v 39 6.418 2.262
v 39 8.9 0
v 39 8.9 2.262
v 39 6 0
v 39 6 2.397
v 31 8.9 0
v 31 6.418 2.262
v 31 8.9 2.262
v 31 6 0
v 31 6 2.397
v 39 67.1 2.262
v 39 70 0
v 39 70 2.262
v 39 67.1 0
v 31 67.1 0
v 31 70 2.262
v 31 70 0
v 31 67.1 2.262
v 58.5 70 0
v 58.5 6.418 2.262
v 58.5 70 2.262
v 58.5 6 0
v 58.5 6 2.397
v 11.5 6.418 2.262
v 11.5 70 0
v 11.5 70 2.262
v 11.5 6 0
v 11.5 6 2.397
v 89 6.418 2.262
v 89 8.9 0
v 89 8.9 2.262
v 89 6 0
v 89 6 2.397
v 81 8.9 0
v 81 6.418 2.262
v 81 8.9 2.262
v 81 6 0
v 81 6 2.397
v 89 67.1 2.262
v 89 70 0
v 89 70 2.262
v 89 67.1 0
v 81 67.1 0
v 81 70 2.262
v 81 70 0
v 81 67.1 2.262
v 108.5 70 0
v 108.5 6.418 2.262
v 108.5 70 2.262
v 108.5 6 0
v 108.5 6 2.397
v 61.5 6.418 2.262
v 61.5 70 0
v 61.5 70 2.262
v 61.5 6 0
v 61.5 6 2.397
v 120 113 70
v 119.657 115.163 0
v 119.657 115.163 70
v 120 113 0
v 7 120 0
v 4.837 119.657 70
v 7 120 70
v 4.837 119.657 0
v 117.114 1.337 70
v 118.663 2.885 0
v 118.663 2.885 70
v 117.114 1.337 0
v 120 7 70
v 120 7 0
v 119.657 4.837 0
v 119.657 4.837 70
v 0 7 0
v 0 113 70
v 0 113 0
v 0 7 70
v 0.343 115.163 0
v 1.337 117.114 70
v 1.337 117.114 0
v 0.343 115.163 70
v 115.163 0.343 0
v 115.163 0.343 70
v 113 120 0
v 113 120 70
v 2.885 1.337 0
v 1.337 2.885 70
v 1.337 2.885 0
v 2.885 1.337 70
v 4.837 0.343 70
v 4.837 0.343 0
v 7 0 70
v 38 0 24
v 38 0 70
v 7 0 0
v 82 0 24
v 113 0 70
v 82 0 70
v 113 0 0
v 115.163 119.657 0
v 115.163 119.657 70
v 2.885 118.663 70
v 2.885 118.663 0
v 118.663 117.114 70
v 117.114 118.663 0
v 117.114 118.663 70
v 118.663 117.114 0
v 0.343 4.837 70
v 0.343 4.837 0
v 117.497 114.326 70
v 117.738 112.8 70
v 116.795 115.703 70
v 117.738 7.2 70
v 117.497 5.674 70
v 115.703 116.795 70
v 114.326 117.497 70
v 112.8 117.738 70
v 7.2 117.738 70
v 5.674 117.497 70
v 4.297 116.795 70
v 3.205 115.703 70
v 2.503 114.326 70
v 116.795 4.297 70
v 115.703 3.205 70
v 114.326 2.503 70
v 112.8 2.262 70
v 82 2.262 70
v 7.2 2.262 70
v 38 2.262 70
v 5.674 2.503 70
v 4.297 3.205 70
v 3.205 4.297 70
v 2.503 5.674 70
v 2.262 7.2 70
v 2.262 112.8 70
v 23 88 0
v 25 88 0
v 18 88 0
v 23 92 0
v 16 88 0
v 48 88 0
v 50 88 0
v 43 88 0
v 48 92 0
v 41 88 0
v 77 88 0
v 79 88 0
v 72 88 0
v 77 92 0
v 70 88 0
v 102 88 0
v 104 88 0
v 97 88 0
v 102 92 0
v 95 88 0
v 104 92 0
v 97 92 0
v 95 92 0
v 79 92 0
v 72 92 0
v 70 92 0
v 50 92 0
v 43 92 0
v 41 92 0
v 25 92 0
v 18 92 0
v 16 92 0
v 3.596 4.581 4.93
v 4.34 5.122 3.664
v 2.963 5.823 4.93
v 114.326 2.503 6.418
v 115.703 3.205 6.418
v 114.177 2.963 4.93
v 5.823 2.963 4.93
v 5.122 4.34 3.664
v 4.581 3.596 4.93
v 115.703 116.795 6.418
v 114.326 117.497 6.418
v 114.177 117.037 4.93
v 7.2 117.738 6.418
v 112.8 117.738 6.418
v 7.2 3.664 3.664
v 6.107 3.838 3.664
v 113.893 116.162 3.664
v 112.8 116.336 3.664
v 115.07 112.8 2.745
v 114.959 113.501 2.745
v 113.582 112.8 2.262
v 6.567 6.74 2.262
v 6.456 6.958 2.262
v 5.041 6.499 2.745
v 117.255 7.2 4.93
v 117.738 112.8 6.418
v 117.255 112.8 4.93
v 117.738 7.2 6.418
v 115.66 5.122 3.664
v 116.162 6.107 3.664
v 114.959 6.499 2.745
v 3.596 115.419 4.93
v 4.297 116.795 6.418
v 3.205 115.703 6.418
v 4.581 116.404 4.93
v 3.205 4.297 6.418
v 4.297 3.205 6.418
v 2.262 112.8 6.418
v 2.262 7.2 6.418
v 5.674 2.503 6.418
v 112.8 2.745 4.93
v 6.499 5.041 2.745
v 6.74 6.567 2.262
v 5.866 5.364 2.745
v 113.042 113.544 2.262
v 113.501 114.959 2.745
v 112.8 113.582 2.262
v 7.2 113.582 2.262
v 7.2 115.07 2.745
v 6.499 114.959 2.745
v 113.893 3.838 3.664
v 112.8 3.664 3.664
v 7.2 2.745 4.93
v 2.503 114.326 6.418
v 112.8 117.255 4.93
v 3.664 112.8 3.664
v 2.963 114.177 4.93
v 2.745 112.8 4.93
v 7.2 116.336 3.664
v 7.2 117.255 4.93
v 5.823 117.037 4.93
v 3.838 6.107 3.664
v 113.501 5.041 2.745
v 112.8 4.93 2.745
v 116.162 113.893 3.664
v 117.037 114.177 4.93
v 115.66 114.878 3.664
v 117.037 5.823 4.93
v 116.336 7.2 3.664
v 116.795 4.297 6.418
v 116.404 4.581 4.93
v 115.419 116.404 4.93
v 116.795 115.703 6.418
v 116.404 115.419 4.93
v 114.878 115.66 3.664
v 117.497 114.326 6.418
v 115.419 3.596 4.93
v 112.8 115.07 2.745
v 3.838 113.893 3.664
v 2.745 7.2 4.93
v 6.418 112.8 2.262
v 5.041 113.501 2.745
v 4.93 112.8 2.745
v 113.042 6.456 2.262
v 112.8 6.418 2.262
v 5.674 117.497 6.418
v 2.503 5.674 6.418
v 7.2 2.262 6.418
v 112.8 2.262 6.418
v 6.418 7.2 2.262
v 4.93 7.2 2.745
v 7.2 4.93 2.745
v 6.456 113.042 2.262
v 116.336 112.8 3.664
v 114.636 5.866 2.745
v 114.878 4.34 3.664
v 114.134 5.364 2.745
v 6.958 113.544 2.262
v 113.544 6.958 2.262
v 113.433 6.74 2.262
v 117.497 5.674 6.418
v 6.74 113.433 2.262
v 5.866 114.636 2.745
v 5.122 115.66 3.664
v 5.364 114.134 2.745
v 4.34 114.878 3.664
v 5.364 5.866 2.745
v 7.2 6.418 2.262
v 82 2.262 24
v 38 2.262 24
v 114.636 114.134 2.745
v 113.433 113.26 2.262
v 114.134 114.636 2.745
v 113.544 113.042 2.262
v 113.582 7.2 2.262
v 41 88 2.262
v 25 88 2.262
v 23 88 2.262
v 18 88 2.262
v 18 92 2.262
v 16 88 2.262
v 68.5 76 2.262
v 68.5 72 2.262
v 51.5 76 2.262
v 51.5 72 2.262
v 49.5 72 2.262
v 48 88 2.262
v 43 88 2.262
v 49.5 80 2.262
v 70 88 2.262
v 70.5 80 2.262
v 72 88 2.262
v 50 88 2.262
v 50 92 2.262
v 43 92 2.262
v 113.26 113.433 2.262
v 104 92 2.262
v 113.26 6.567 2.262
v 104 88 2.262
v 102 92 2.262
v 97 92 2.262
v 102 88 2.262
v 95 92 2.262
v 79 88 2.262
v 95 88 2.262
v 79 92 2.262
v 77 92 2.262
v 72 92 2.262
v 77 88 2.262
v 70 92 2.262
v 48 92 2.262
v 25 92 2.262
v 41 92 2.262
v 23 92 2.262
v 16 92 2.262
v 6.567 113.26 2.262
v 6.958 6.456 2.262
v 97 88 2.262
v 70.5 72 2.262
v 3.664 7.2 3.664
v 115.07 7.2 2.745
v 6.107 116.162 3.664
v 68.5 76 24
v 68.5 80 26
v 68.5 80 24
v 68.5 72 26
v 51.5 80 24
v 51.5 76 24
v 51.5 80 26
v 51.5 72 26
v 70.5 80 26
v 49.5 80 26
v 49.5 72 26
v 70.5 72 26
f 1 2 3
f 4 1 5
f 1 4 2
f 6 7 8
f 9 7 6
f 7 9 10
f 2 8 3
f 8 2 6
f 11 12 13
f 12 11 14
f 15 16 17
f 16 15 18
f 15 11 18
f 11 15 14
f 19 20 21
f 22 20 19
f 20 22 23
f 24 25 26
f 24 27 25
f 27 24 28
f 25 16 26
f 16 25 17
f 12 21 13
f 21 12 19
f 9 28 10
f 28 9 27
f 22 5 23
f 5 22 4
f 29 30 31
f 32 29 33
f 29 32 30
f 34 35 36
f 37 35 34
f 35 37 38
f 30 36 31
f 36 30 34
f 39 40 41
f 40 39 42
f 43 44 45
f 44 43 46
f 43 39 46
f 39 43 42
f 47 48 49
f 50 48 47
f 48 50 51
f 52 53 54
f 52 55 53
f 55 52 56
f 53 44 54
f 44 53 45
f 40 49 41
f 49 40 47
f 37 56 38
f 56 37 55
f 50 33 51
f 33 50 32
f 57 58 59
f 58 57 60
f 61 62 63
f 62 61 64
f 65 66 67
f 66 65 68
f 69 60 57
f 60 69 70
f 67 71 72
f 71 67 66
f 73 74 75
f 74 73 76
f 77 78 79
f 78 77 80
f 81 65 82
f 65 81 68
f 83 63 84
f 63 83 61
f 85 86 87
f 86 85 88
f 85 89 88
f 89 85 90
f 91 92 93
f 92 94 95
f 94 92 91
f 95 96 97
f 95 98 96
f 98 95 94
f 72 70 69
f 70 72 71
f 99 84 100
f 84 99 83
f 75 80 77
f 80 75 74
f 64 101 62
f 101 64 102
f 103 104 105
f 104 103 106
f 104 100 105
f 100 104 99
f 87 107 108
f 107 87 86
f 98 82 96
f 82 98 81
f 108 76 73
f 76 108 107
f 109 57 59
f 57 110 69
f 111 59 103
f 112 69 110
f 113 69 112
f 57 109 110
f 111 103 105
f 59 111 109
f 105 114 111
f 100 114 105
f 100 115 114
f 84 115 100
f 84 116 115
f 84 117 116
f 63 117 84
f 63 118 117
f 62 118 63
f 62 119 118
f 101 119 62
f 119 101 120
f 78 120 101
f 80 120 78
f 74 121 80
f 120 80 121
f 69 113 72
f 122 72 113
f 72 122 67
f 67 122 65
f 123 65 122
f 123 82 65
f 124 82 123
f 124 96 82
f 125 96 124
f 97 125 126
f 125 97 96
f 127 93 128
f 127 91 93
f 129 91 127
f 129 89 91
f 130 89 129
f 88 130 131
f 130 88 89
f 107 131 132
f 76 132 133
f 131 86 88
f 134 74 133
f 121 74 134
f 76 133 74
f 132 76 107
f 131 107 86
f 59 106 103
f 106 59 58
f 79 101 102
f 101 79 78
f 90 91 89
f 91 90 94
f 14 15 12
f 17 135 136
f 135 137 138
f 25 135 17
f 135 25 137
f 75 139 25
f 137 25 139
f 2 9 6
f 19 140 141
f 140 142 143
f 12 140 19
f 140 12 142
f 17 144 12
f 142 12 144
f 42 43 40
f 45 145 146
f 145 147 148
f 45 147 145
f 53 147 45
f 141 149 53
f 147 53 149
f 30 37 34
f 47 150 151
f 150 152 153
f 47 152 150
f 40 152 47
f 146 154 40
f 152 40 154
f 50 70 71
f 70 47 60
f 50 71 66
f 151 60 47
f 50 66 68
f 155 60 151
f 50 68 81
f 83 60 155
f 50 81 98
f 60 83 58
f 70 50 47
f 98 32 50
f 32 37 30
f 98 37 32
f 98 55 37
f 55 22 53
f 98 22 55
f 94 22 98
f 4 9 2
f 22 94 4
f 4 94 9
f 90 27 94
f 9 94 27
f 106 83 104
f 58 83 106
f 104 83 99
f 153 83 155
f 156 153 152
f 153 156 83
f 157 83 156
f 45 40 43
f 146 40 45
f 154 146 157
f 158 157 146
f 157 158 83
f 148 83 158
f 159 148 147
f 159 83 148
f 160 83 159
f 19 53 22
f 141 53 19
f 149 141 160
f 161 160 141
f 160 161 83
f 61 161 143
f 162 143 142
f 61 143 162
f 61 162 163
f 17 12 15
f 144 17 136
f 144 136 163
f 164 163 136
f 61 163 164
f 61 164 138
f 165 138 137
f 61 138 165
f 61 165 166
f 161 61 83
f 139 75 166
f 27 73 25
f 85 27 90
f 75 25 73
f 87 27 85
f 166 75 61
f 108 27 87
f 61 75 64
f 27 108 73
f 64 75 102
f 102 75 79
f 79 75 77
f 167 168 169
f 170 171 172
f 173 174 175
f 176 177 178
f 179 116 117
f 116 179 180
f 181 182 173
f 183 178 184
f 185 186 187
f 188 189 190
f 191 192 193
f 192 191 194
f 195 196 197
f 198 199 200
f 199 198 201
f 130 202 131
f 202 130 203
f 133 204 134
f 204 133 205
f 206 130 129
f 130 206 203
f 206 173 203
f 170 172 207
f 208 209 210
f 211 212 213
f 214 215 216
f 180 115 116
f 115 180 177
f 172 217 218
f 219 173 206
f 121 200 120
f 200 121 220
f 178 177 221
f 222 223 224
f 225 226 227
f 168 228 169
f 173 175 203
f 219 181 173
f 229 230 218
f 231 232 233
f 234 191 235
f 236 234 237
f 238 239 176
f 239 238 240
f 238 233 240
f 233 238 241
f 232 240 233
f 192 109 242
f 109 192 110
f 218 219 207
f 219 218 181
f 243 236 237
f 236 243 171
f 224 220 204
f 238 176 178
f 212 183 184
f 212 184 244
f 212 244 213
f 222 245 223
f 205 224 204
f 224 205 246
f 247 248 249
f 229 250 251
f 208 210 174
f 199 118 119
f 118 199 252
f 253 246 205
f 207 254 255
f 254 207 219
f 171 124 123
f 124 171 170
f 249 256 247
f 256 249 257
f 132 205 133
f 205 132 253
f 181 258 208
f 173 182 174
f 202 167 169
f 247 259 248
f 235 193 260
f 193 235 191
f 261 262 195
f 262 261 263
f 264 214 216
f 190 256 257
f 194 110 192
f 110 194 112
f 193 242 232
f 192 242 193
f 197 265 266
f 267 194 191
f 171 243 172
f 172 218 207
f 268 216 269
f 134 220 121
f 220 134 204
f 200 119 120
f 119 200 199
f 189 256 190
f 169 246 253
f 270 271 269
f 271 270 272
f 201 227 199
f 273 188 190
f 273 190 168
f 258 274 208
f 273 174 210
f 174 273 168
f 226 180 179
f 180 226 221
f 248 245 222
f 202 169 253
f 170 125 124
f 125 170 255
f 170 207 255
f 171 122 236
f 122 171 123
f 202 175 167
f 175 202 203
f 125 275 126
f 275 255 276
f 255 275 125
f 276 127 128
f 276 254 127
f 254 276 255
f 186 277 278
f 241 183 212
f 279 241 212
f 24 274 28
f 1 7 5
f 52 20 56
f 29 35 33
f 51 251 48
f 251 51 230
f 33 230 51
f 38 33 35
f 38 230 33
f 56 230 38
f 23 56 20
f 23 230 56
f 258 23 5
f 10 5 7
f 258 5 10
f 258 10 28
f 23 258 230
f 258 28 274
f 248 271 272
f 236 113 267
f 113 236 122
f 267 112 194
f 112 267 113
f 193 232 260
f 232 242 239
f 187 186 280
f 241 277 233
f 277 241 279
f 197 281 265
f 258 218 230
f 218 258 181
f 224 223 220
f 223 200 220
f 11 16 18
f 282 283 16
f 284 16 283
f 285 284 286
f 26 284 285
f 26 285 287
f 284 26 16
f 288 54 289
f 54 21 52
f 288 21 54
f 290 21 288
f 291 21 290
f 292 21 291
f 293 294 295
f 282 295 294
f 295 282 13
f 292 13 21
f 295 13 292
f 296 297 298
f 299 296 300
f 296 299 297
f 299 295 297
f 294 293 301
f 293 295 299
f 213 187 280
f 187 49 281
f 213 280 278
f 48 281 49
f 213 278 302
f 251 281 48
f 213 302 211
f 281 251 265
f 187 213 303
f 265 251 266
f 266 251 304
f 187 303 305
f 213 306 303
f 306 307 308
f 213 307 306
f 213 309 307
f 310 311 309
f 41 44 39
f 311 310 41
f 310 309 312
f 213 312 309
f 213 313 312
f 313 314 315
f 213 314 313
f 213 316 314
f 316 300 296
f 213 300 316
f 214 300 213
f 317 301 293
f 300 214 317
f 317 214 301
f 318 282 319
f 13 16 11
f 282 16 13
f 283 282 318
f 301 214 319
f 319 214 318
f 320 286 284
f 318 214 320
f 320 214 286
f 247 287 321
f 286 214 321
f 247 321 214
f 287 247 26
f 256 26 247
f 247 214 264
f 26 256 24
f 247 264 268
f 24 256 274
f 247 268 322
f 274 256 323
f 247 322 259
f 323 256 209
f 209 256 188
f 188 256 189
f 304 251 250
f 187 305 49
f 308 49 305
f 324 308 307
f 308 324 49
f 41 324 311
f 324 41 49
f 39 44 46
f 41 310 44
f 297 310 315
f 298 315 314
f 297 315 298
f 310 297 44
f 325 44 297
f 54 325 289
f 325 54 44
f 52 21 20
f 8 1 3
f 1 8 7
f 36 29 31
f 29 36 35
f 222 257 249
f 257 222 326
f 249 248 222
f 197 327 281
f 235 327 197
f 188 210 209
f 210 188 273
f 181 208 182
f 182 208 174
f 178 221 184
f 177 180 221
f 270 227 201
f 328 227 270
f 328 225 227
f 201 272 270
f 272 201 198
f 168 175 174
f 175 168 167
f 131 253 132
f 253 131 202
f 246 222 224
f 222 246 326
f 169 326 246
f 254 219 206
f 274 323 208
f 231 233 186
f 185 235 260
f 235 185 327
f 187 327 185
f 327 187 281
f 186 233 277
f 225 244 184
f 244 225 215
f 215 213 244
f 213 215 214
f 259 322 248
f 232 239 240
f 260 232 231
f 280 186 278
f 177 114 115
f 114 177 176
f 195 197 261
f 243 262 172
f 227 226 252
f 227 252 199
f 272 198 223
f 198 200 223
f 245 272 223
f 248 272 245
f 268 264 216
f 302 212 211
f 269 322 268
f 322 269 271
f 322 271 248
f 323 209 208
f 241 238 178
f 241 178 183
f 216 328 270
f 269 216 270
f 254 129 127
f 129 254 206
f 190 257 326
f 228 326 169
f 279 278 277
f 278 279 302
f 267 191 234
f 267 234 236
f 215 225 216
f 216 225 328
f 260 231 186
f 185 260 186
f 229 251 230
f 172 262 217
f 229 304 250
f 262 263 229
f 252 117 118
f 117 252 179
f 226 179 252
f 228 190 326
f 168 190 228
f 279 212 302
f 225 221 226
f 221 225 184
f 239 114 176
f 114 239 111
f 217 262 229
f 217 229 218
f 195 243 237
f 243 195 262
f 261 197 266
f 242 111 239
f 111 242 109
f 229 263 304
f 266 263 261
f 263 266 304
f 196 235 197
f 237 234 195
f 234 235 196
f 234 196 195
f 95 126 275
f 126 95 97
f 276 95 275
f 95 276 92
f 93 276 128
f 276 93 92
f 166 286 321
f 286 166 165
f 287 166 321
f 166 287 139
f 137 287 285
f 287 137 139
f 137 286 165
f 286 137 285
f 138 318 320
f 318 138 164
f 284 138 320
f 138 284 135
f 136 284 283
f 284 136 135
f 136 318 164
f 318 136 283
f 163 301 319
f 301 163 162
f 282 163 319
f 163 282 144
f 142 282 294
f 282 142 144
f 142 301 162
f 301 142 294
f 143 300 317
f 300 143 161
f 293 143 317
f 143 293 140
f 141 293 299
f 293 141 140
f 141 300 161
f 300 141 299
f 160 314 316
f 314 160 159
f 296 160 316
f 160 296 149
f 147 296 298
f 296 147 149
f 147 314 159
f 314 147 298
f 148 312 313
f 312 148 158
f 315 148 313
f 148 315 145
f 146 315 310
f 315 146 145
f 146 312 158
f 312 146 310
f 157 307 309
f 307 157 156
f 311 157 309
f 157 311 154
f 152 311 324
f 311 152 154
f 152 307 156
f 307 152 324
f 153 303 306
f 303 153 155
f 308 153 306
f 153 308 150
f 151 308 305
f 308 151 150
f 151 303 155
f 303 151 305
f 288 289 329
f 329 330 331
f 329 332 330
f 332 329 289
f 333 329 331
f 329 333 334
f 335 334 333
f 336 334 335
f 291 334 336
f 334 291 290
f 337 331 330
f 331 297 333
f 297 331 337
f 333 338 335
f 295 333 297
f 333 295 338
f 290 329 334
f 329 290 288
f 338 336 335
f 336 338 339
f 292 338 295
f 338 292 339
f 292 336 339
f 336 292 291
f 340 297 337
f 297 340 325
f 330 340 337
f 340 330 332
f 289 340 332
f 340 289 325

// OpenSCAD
t=2.2;
tw=120;
tl=120;
th=70;
difference(){
  cube2([tw,tl,th],r=7);
  translate([t,t,t]) cube2([tw-t*2,tl-t*2,th+10],r=5,v=1);
  translate([tw/2-22,-.1,24]) cube([44,100,50]);
  translate([0,0,-.1]) linear_extrude(t+.2) for(x=[tw/2-44,tw/2+10],y=[88])
    translate([x,y]) fuse_holes();
  for(x=[tw/2-25,tw/2+25])
    translate([x,38,-.1]) rotate([0,0,0]) relay_hole();
}
translate([tw/2-17/2,76]) {
  cube([17,4,24]);
  translate([-2,-4]) cube([2,8,26]);
  translate([17,-4]) cube([2,8,26]);
}

module cube2(dims,r=5,v=0,$fn=20)
{
  if(v) minkowski() { translate([r,r,r]) cube([dims[0]-r*2,dims[1]-r*2,dims[2]-r*2]); sphere(r=r,$fn=$fn); }
  else linear_extrude(dims[2],convexity=4) {
    translate([r,0]) square([dims[0]-r*2,dims[1]]);
    translate([0,r]) square([dims[0],dims[1]-r*2]);
    for(x=[r,dims[0]-r],y=[r,dims[1]-r])
      translate([x,y]) circle(r=r,$fn=$fn);
  }
}

module relay_hole() {
  translate([-23.5,-32]) difference() {
    cube([47,64,t+1]);
    for(y=[0,61.2])
    translate([47/2-4,y-.1,-.1]) cube([8,3,t+2]);
  }
}
module fuse_holes() {
  square([2,4]);
  translate([7,0]) square([2,4]);
  translate([25,0]) square([2,4]);
  translate([32,0]) square([2,4]);
}
